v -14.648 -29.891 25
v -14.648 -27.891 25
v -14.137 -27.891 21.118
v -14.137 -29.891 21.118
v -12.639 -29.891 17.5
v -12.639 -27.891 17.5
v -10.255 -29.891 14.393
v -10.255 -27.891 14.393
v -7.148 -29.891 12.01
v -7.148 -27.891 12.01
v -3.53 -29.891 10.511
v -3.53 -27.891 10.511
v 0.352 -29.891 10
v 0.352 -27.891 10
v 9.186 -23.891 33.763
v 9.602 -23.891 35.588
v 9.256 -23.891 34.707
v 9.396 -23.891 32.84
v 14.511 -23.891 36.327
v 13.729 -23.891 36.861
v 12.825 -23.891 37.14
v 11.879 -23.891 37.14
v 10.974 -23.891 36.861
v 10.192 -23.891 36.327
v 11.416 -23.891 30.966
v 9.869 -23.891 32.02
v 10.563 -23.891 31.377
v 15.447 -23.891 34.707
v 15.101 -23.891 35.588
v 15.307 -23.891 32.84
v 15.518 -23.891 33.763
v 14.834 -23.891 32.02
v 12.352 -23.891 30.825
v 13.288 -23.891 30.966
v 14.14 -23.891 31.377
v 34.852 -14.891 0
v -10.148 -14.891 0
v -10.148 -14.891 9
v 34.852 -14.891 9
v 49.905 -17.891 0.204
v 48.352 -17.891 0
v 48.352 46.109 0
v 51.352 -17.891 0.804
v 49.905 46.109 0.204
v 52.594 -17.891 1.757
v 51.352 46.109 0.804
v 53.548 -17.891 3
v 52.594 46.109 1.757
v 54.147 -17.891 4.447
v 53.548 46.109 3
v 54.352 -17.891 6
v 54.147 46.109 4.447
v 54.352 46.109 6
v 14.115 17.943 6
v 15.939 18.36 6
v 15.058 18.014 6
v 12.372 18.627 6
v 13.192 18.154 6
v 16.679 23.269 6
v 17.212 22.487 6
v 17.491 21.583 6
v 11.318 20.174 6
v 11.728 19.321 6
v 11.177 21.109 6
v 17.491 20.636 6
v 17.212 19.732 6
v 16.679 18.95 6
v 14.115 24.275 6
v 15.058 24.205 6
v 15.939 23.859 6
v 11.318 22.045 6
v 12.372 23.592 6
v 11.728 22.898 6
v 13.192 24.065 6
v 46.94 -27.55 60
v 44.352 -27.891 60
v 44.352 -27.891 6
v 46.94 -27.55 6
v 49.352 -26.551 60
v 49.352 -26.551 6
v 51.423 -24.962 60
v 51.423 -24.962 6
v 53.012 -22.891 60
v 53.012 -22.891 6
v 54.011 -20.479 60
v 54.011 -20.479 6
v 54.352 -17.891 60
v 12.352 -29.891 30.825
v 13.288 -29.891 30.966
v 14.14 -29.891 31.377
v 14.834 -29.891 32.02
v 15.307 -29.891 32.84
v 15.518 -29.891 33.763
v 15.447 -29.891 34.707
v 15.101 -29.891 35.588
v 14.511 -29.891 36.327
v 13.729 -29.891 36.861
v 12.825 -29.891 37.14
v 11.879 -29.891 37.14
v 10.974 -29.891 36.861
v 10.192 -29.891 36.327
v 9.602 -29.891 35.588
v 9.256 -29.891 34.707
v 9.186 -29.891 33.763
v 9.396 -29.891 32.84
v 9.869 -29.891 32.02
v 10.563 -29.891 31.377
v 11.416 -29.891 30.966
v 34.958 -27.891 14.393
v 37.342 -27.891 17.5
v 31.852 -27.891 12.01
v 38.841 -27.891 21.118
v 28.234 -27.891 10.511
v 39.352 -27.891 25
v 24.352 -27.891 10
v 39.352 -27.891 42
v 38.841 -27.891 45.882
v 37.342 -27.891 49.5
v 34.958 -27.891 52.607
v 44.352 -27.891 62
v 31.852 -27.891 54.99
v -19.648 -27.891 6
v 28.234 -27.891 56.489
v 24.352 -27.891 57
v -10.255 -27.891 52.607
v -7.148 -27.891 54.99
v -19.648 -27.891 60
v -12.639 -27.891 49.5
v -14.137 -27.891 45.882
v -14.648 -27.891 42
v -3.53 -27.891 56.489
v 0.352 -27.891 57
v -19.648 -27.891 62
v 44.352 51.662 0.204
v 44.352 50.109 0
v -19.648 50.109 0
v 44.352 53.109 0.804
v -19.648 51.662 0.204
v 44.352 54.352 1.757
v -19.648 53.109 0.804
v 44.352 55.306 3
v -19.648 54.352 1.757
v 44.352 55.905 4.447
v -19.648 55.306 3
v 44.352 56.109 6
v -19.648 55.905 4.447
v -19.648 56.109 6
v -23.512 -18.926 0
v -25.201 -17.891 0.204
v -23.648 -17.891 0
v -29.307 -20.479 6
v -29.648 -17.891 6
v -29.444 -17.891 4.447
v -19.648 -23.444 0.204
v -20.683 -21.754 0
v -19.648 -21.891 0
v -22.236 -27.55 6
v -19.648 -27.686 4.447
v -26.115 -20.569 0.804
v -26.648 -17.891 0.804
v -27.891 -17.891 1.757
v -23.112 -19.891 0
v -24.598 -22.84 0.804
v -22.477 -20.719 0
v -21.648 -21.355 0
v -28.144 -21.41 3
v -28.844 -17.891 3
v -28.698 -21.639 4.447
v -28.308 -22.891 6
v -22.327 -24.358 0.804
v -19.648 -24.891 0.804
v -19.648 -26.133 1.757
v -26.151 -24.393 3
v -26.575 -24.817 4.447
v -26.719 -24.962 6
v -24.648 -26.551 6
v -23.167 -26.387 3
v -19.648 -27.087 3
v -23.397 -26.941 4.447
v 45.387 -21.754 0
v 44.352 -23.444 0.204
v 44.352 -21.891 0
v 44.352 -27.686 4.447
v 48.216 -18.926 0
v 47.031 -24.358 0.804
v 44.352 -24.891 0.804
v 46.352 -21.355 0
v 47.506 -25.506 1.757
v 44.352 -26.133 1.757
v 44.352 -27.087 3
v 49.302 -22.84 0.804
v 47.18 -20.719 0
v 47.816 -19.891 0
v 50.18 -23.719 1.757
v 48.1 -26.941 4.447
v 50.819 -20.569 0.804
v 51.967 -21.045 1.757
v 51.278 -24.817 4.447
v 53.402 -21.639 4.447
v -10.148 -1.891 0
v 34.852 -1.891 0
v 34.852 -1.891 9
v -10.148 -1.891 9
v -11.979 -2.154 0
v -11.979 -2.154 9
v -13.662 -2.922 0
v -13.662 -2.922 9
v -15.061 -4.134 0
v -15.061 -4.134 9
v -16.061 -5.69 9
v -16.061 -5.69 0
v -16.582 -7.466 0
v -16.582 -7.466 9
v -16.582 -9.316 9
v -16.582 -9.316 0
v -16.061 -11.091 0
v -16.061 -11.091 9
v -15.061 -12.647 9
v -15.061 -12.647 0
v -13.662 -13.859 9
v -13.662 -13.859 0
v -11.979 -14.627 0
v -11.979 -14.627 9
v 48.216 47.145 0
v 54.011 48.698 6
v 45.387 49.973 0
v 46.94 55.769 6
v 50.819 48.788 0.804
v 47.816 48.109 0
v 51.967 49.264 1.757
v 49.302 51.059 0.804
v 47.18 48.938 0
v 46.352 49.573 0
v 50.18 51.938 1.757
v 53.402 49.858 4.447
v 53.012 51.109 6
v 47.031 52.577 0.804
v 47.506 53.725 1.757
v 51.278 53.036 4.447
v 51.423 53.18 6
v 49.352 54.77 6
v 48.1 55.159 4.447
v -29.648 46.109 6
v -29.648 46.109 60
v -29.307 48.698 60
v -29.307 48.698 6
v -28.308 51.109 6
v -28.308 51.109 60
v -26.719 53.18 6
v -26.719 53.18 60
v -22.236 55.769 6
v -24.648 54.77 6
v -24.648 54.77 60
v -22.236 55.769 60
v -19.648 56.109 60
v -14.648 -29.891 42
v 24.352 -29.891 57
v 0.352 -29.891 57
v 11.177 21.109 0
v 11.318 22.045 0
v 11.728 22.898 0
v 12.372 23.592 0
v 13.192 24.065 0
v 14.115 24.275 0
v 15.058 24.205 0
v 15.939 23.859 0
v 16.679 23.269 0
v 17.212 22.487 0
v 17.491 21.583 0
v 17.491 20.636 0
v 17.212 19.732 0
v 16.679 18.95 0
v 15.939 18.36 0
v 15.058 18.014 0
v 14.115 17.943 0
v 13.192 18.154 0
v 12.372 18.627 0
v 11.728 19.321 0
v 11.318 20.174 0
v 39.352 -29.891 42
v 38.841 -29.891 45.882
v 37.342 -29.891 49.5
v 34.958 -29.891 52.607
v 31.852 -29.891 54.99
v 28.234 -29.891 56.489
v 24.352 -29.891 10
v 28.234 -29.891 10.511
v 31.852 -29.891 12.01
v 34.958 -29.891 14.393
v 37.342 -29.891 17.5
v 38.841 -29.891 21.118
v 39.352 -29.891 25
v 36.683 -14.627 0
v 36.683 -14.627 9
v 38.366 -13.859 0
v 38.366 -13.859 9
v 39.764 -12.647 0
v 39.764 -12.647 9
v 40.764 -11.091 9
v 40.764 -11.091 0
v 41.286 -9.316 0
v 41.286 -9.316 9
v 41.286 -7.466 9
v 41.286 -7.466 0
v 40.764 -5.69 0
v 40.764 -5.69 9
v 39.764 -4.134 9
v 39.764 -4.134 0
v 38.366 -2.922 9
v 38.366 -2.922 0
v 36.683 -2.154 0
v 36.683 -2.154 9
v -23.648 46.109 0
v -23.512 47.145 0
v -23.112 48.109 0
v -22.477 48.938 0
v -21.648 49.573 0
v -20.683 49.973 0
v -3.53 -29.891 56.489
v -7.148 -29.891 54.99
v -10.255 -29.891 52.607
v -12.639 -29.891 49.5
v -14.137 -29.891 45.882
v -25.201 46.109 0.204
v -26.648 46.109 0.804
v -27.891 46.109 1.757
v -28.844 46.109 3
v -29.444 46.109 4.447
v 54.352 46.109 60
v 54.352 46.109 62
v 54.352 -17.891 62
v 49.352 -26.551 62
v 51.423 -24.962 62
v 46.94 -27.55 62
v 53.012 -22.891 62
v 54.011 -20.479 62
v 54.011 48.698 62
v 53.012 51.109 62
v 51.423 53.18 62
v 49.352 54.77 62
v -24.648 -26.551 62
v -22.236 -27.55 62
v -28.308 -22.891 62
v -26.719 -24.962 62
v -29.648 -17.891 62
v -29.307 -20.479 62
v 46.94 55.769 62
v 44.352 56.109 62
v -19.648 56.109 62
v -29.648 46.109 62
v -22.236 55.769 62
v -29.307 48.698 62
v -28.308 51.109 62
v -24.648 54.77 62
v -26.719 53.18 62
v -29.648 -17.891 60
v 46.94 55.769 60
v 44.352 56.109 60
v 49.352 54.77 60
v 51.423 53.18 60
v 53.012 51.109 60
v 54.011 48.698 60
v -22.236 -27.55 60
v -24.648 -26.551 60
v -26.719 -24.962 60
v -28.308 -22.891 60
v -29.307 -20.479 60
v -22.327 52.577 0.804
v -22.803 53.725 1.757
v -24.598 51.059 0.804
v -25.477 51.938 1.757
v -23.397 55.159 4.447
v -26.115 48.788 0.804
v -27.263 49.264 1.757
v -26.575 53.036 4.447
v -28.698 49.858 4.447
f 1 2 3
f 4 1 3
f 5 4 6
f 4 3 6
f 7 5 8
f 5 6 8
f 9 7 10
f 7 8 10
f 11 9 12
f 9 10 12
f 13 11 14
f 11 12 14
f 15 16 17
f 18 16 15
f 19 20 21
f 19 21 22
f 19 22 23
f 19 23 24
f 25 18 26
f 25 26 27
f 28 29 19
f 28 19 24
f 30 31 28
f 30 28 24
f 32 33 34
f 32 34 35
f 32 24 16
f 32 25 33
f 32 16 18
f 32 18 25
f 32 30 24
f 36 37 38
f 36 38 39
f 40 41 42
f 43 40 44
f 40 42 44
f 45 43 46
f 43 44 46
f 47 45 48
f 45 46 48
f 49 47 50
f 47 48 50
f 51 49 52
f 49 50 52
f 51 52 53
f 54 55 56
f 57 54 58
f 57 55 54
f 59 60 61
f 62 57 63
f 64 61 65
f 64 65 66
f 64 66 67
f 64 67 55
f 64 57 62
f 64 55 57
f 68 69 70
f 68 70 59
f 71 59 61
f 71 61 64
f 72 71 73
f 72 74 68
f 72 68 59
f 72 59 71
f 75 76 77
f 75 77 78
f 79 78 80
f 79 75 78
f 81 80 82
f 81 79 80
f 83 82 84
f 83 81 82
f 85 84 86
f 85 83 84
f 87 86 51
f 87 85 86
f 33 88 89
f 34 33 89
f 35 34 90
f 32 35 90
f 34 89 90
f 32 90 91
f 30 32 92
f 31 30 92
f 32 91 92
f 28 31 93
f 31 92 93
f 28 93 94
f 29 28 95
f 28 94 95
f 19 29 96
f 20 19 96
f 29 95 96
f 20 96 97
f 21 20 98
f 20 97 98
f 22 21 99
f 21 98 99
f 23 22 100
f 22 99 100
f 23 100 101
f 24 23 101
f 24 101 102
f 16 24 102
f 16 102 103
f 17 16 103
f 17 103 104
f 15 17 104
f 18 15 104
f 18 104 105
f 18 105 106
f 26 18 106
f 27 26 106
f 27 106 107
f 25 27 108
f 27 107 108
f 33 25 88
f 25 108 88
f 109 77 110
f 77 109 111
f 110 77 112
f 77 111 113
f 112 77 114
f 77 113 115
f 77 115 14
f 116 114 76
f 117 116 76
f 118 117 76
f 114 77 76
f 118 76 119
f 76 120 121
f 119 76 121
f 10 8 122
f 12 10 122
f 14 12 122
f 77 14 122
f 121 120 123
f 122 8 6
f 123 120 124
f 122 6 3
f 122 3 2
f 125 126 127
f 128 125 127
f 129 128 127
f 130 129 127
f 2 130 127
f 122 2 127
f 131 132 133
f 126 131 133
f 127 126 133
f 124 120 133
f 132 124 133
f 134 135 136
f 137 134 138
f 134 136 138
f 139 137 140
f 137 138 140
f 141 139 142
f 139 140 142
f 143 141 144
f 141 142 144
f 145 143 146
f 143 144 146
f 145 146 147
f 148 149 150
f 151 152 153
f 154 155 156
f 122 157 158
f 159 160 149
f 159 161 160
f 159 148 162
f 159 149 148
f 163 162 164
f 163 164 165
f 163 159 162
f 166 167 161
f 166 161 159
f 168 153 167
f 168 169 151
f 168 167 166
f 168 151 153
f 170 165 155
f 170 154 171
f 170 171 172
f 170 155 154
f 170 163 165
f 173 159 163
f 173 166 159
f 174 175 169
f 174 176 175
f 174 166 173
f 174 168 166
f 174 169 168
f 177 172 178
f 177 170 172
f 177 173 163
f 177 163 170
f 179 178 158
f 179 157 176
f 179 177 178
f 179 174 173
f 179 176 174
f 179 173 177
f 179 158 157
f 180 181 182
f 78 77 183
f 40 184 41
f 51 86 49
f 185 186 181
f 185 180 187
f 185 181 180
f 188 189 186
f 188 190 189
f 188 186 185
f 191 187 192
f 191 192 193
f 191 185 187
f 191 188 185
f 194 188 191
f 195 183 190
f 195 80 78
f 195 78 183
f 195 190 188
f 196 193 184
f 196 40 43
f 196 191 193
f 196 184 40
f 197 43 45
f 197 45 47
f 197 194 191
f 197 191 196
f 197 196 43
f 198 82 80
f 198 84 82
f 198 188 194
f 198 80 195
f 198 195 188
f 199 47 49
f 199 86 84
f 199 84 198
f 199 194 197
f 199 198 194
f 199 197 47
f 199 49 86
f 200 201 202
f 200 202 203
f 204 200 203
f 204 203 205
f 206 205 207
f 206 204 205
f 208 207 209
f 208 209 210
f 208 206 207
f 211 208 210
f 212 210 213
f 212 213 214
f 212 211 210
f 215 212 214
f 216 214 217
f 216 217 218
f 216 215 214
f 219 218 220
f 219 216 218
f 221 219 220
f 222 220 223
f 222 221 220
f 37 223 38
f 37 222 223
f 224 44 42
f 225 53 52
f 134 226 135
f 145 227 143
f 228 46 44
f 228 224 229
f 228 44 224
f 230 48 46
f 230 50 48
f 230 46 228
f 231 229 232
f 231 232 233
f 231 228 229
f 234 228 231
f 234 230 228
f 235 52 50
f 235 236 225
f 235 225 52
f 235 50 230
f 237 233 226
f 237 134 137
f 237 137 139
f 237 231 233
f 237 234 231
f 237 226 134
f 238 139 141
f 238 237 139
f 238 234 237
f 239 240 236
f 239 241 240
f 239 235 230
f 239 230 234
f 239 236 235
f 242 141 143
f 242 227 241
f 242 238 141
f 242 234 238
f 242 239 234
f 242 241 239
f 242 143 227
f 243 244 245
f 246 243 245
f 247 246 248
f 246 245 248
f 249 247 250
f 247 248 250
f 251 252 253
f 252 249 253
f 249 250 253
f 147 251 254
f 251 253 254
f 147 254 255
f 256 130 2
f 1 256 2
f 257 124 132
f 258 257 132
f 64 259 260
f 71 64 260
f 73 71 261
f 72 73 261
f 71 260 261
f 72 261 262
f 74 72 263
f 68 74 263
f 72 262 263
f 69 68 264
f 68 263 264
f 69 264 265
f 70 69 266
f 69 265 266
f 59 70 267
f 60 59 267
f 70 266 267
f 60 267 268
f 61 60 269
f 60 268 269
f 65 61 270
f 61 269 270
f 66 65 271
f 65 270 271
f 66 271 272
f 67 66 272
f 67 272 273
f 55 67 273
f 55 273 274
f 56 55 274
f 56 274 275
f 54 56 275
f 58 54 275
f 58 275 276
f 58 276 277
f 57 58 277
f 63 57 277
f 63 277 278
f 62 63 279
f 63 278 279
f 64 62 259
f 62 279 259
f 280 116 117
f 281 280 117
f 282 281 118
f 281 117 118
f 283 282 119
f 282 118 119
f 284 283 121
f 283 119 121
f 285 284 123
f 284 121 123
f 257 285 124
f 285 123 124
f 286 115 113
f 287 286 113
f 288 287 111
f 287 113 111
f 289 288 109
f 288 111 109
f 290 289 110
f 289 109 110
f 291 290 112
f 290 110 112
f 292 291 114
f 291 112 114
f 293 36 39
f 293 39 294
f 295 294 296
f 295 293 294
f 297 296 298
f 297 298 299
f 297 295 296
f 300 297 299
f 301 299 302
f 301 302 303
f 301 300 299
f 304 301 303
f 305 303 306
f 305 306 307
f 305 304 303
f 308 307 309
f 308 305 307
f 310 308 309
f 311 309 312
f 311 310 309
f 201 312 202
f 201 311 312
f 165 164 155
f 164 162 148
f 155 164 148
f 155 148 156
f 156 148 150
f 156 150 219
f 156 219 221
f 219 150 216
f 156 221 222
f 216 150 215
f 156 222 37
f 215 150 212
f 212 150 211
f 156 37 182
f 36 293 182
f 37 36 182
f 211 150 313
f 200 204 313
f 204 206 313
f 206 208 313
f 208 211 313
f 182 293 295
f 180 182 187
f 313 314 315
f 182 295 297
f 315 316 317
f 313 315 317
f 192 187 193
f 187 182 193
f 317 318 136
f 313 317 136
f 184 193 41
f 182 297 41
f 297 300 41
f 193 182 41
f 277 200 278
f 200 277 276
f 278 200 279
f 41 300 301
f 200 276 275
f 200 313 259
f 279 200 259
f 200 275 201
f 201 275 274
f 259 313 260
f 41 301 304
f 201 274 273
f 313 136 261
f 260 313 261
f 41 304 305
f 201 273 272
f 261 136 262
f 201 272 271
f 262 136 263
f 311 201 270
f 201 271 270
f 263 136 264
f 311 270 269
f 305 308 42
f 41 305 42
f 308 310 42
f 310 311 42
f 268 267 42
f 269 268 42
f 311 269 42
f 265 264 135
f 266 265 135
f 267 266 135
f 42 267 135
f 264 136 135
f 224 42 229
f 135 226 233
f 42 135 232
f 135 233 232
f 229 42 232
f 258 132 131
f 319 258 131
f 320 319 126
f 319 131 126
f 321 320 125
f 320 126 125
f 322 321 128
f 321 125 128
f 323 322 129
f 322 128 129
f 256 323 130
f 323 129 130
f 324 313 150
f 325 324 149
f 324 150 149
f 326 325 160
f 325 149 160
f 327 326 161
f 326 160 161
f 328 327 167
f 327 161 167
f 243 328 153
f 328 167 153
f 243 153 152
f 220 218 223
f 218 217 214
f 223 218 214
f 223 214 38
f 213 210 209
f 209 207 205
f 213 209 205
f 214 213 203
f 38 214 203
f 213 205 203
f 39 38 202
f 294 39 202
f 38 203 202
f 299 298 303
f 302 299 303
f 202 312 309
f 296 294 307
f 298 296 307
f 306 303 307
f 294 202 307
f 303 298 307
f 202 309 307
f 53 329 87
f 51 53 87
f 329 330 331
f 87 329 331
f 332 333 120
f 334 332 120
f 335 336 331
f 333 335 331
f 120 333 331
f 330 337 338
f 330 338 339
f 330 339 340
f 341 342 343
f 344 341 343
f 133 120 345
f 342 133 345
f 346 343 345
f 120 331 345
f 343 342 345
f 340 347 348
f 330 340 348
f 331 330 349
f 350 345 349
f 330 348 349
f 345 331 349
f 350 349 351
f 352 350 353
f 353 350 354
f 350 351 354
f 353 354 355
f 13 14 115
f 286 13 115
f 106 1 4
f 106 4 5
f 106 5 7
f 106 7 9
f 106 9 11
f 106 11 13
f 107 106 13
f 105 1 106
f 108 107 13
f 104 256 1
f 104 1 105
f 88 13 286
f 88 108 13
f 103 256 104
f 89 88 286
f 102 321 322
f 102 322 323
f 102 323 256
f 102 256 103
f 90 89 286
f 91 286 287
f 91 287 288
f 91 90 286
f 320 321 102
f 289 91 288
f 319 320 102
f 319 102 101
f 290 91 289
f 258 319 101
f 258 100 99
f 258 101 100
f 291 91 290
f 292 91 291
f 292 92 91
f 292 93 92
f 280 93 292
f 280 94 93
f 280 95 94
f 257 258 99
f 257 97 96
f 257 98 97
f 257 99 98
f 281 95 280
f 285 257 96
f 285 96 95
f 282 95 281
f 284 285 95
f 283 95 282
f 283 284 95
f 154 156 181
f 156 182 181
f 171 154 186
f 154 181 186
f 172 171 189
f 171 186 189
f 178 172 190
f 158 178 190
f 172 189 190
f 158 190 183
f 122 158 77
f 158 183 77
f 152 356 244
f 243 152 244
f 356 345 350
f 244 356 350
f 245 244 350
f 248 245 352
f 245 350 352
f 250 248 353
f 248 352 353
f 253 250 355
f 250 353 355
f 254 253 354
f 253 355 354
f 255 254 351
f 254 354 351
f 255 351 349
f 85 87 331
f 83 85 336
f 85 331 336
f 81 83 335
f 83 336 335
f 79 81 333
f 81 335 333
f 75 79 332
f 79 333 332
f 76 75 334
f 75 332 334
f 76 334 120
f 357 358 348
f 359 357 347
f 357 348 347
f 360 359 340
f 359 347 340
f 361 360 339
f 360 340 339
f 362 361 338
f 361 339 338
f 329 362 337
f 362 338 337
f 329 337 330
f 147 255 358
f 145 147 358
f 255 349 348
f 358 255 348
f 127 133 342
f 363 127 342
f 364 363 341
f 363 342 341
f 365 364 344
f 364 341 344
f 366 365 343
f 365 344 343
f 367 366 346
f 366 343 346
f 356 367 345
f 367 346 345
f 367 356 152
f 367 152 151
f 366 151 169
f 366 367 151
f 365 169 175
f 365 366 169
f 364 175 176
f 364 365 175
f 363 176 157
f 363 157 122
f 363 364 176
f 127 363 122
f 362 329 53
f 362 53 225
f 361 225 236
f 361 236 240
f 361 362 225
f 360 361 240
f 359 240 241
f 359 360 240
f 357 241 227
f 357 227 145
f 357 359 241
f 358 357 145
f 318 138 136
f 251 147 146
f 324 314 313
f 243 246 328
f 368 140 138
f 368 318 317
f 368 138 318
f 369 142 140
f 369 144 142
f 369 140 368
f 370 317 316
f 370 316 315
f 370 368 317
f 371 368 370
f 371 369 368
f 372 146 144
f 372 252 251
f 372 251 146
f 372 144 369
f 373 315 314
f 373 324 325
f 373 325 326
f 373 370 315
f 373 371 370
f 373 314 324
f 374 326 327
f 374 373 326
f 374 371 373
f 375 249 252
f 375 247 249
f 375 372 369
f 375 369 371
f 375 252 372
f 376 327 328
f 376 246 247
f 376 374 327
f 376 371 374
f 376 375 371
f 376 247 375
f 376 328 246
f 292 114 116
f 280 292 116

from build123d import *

# Parameters (mm, degrees)
ESQUISSE1_W             = 84
ESQUISSE1_H             = 84
BOSS_EXTRU_1_DEPTH      = 60
CONG_1_R                = 10
CONG_2_R                = 6
BOSS_EXTRU_2_DEPTH      = 2
ESQUISSE5_R             = 3.175
ENL_V_MAT_EXTRU_1_DEPTH = 6
ENL_V_MAT_EXTRU_2_DEPTH = 9
ESQUISSE7_R             = 3.175
ENL_V_MAT_EXTRU_3_DEPTH = 6
BOSS_EXTRU_3_START      = 2
BOSS_EXTRU_3_DEPTH      = 2


with BuildPart() as part:
    # Esquisse1 → Boss.-Extru.1 (new body)
    with BuildSketch(Plane.XY):
        with Locations((12.35180193, 14.109375)):
            Rectangle(ESQUISSE1_W, ESQUISSE1_H)
    extrude(amount=BOSS_EXTRU_1_DEPTH)

    # Congé1
    cong_1_edges = [part.edges().sort_by_distance(p)[0] for p in [
        (-29.64819807, 56.109375, 30),
        (54.35180193, 56.109375, 30),
        (54.35180193, -27.890625, 30),
        (-29.64819807, -27.890625, 30),
    ]]
    fillet(cong_1_edges, radius=CONG_1_R)

    # Congé2
    cong_2_edges = [part.edges().sort_by_distance(p)[0] for p in [
        (12.35180193, -27.890625, 0),
        (-29.64819807, 14.109375, 0),
        (12.35180193, 56.109375, 0),
        (54.35180193, 14.109375, 0),
        (51.422869741, 53.180442812, 0),
        (-26.719265882, 53.180442812, 0),
        (51.422869741, -24.961692812, 0),
        (-26.719265882, -24.961692812, 0),
    ]]
    fillet(cong_2_edges, radius=CONG_2_R)

    # Esquisse2 → Boss.-Extru.2 (add)
    with BuildSketch(Plane.XZ.offset(27.890625)):
        with BuildLine():
            Line((24.35180193, 57), (0.35180193, 57))
            ThreePointArc((0.35180193, 57), (-10.254799788, 52.606601718), (-14.64819807, 42))
            Line((-14.64819807, 42), (-14.64819807, 25))
            ThreePointArc((-14.64819807, 25), (-10.254799788, 14.393398282), (0.35180193, 10))
            Line((0.35180193, 10), (24.35180193, 10))
            ThreePointArc((24.35180193, 10), (34.958403647, 14.393398282), (39.35180193, 25))
            Line((39.35180193, 25), (39.35180193, 42))
            ThreePointArc((39.35180193, 42), (34.958403647, 52.606601718), (24.35180193, 57))
        make_face()
    extrude(amount=BOSS_EXTRU_2_DEPTH)

    # Esquisse5 → Enlèv. mat.-Extru.1 (cut)
    with BuildSketch(Plane.XZ.offset(29.890625)):
        with Locations(Location((12.35180193, 34, 0), (0, 0, 270))):
            Circle(ESQUISSE5_R)
    extrude(amount=-ENL_V_MAT_EXTRU_1_DEPTH, mode=Mode.SUBTRACT)

    # Esquisse6 → Enlèv. mat.-Extru.2 (cut)
    with BuildSketch(Plane(origin=(0, 0, 0), x_dir=(-1, 0, 0), z_dir=(0, 0, -1))):
        with BuildLine():
            Line((-34.85180193, -1.890625), (10.14819807, -1.890625))
            ThreePointArc((10.14819807, -1.890625), (16.64819807, -8.390625), (10.14819807, -14.890625))
            Line((10.14819807, -14.890625), (-34.85180193, -14.890625))
            ThreePointArc((-34.85180193, -14.890625), (-41.35180193, -8.390625), (-34.85180193, -1.890625))
        make_face()
    extrude(amount=-ENL_V_MAT_EXTRU_2_DEPTH, mode=Mode.SUBTRACT)

    # Esquisse7 → Enlèv. mat.-Extru.3 (cut)
    with BuildSketch(Plane(origin=(0, 0, 0), x_dir=(-1, 0, 0), z_dir=(0, 0, -1))):
        with Locations((-14.35180193, 21.109375)):
            Circle(ESQUISSE7_R)
    extrude(amount=-ENL_V_MAT_EXTRU_3_DEPTH, mode=Mode.SUBTRACT)

    # Esquisse8 → Boss.-Extru.3 (add)
    with BuildSketch(Plane.XY.offset(60).offset(BOSS_EXTRU_3_START)):
        with BuildLine():
            Line((-19.64819807, 56.109375), (44.35180193, 56.109375))
            ThreePointArc((44.35180193, 56.109375), (51.422869741, 53.180442812), (54.35180193, 46.109375))
            Line((54.35180193, 46.109375), (54.35180193, -17.890625))
            ThreePointArc((54.35180193, -17.890625), (51.422869741, -24.961692812), (44.35180193, -27.890625))
            Line((44.35180193, -27.890625), (-19.64819807, -27.890625))
            ThreePointArc((-19.64819807, -27.890625), (-26.719265882, -24.961692812), (-29.64819807, -17.890625))
            Line((-29.64819807, -17.890625), (-29.64819807, 46.109375))
            ThreePointArc((-29.64819807, 46.109375), (-26.719265882, 53.180442812), (-19.64819807, 56.109375))
        make_face()
    extrude(amount=-BOSS_EXTRU_3_DEPTH)


solid = part.part
